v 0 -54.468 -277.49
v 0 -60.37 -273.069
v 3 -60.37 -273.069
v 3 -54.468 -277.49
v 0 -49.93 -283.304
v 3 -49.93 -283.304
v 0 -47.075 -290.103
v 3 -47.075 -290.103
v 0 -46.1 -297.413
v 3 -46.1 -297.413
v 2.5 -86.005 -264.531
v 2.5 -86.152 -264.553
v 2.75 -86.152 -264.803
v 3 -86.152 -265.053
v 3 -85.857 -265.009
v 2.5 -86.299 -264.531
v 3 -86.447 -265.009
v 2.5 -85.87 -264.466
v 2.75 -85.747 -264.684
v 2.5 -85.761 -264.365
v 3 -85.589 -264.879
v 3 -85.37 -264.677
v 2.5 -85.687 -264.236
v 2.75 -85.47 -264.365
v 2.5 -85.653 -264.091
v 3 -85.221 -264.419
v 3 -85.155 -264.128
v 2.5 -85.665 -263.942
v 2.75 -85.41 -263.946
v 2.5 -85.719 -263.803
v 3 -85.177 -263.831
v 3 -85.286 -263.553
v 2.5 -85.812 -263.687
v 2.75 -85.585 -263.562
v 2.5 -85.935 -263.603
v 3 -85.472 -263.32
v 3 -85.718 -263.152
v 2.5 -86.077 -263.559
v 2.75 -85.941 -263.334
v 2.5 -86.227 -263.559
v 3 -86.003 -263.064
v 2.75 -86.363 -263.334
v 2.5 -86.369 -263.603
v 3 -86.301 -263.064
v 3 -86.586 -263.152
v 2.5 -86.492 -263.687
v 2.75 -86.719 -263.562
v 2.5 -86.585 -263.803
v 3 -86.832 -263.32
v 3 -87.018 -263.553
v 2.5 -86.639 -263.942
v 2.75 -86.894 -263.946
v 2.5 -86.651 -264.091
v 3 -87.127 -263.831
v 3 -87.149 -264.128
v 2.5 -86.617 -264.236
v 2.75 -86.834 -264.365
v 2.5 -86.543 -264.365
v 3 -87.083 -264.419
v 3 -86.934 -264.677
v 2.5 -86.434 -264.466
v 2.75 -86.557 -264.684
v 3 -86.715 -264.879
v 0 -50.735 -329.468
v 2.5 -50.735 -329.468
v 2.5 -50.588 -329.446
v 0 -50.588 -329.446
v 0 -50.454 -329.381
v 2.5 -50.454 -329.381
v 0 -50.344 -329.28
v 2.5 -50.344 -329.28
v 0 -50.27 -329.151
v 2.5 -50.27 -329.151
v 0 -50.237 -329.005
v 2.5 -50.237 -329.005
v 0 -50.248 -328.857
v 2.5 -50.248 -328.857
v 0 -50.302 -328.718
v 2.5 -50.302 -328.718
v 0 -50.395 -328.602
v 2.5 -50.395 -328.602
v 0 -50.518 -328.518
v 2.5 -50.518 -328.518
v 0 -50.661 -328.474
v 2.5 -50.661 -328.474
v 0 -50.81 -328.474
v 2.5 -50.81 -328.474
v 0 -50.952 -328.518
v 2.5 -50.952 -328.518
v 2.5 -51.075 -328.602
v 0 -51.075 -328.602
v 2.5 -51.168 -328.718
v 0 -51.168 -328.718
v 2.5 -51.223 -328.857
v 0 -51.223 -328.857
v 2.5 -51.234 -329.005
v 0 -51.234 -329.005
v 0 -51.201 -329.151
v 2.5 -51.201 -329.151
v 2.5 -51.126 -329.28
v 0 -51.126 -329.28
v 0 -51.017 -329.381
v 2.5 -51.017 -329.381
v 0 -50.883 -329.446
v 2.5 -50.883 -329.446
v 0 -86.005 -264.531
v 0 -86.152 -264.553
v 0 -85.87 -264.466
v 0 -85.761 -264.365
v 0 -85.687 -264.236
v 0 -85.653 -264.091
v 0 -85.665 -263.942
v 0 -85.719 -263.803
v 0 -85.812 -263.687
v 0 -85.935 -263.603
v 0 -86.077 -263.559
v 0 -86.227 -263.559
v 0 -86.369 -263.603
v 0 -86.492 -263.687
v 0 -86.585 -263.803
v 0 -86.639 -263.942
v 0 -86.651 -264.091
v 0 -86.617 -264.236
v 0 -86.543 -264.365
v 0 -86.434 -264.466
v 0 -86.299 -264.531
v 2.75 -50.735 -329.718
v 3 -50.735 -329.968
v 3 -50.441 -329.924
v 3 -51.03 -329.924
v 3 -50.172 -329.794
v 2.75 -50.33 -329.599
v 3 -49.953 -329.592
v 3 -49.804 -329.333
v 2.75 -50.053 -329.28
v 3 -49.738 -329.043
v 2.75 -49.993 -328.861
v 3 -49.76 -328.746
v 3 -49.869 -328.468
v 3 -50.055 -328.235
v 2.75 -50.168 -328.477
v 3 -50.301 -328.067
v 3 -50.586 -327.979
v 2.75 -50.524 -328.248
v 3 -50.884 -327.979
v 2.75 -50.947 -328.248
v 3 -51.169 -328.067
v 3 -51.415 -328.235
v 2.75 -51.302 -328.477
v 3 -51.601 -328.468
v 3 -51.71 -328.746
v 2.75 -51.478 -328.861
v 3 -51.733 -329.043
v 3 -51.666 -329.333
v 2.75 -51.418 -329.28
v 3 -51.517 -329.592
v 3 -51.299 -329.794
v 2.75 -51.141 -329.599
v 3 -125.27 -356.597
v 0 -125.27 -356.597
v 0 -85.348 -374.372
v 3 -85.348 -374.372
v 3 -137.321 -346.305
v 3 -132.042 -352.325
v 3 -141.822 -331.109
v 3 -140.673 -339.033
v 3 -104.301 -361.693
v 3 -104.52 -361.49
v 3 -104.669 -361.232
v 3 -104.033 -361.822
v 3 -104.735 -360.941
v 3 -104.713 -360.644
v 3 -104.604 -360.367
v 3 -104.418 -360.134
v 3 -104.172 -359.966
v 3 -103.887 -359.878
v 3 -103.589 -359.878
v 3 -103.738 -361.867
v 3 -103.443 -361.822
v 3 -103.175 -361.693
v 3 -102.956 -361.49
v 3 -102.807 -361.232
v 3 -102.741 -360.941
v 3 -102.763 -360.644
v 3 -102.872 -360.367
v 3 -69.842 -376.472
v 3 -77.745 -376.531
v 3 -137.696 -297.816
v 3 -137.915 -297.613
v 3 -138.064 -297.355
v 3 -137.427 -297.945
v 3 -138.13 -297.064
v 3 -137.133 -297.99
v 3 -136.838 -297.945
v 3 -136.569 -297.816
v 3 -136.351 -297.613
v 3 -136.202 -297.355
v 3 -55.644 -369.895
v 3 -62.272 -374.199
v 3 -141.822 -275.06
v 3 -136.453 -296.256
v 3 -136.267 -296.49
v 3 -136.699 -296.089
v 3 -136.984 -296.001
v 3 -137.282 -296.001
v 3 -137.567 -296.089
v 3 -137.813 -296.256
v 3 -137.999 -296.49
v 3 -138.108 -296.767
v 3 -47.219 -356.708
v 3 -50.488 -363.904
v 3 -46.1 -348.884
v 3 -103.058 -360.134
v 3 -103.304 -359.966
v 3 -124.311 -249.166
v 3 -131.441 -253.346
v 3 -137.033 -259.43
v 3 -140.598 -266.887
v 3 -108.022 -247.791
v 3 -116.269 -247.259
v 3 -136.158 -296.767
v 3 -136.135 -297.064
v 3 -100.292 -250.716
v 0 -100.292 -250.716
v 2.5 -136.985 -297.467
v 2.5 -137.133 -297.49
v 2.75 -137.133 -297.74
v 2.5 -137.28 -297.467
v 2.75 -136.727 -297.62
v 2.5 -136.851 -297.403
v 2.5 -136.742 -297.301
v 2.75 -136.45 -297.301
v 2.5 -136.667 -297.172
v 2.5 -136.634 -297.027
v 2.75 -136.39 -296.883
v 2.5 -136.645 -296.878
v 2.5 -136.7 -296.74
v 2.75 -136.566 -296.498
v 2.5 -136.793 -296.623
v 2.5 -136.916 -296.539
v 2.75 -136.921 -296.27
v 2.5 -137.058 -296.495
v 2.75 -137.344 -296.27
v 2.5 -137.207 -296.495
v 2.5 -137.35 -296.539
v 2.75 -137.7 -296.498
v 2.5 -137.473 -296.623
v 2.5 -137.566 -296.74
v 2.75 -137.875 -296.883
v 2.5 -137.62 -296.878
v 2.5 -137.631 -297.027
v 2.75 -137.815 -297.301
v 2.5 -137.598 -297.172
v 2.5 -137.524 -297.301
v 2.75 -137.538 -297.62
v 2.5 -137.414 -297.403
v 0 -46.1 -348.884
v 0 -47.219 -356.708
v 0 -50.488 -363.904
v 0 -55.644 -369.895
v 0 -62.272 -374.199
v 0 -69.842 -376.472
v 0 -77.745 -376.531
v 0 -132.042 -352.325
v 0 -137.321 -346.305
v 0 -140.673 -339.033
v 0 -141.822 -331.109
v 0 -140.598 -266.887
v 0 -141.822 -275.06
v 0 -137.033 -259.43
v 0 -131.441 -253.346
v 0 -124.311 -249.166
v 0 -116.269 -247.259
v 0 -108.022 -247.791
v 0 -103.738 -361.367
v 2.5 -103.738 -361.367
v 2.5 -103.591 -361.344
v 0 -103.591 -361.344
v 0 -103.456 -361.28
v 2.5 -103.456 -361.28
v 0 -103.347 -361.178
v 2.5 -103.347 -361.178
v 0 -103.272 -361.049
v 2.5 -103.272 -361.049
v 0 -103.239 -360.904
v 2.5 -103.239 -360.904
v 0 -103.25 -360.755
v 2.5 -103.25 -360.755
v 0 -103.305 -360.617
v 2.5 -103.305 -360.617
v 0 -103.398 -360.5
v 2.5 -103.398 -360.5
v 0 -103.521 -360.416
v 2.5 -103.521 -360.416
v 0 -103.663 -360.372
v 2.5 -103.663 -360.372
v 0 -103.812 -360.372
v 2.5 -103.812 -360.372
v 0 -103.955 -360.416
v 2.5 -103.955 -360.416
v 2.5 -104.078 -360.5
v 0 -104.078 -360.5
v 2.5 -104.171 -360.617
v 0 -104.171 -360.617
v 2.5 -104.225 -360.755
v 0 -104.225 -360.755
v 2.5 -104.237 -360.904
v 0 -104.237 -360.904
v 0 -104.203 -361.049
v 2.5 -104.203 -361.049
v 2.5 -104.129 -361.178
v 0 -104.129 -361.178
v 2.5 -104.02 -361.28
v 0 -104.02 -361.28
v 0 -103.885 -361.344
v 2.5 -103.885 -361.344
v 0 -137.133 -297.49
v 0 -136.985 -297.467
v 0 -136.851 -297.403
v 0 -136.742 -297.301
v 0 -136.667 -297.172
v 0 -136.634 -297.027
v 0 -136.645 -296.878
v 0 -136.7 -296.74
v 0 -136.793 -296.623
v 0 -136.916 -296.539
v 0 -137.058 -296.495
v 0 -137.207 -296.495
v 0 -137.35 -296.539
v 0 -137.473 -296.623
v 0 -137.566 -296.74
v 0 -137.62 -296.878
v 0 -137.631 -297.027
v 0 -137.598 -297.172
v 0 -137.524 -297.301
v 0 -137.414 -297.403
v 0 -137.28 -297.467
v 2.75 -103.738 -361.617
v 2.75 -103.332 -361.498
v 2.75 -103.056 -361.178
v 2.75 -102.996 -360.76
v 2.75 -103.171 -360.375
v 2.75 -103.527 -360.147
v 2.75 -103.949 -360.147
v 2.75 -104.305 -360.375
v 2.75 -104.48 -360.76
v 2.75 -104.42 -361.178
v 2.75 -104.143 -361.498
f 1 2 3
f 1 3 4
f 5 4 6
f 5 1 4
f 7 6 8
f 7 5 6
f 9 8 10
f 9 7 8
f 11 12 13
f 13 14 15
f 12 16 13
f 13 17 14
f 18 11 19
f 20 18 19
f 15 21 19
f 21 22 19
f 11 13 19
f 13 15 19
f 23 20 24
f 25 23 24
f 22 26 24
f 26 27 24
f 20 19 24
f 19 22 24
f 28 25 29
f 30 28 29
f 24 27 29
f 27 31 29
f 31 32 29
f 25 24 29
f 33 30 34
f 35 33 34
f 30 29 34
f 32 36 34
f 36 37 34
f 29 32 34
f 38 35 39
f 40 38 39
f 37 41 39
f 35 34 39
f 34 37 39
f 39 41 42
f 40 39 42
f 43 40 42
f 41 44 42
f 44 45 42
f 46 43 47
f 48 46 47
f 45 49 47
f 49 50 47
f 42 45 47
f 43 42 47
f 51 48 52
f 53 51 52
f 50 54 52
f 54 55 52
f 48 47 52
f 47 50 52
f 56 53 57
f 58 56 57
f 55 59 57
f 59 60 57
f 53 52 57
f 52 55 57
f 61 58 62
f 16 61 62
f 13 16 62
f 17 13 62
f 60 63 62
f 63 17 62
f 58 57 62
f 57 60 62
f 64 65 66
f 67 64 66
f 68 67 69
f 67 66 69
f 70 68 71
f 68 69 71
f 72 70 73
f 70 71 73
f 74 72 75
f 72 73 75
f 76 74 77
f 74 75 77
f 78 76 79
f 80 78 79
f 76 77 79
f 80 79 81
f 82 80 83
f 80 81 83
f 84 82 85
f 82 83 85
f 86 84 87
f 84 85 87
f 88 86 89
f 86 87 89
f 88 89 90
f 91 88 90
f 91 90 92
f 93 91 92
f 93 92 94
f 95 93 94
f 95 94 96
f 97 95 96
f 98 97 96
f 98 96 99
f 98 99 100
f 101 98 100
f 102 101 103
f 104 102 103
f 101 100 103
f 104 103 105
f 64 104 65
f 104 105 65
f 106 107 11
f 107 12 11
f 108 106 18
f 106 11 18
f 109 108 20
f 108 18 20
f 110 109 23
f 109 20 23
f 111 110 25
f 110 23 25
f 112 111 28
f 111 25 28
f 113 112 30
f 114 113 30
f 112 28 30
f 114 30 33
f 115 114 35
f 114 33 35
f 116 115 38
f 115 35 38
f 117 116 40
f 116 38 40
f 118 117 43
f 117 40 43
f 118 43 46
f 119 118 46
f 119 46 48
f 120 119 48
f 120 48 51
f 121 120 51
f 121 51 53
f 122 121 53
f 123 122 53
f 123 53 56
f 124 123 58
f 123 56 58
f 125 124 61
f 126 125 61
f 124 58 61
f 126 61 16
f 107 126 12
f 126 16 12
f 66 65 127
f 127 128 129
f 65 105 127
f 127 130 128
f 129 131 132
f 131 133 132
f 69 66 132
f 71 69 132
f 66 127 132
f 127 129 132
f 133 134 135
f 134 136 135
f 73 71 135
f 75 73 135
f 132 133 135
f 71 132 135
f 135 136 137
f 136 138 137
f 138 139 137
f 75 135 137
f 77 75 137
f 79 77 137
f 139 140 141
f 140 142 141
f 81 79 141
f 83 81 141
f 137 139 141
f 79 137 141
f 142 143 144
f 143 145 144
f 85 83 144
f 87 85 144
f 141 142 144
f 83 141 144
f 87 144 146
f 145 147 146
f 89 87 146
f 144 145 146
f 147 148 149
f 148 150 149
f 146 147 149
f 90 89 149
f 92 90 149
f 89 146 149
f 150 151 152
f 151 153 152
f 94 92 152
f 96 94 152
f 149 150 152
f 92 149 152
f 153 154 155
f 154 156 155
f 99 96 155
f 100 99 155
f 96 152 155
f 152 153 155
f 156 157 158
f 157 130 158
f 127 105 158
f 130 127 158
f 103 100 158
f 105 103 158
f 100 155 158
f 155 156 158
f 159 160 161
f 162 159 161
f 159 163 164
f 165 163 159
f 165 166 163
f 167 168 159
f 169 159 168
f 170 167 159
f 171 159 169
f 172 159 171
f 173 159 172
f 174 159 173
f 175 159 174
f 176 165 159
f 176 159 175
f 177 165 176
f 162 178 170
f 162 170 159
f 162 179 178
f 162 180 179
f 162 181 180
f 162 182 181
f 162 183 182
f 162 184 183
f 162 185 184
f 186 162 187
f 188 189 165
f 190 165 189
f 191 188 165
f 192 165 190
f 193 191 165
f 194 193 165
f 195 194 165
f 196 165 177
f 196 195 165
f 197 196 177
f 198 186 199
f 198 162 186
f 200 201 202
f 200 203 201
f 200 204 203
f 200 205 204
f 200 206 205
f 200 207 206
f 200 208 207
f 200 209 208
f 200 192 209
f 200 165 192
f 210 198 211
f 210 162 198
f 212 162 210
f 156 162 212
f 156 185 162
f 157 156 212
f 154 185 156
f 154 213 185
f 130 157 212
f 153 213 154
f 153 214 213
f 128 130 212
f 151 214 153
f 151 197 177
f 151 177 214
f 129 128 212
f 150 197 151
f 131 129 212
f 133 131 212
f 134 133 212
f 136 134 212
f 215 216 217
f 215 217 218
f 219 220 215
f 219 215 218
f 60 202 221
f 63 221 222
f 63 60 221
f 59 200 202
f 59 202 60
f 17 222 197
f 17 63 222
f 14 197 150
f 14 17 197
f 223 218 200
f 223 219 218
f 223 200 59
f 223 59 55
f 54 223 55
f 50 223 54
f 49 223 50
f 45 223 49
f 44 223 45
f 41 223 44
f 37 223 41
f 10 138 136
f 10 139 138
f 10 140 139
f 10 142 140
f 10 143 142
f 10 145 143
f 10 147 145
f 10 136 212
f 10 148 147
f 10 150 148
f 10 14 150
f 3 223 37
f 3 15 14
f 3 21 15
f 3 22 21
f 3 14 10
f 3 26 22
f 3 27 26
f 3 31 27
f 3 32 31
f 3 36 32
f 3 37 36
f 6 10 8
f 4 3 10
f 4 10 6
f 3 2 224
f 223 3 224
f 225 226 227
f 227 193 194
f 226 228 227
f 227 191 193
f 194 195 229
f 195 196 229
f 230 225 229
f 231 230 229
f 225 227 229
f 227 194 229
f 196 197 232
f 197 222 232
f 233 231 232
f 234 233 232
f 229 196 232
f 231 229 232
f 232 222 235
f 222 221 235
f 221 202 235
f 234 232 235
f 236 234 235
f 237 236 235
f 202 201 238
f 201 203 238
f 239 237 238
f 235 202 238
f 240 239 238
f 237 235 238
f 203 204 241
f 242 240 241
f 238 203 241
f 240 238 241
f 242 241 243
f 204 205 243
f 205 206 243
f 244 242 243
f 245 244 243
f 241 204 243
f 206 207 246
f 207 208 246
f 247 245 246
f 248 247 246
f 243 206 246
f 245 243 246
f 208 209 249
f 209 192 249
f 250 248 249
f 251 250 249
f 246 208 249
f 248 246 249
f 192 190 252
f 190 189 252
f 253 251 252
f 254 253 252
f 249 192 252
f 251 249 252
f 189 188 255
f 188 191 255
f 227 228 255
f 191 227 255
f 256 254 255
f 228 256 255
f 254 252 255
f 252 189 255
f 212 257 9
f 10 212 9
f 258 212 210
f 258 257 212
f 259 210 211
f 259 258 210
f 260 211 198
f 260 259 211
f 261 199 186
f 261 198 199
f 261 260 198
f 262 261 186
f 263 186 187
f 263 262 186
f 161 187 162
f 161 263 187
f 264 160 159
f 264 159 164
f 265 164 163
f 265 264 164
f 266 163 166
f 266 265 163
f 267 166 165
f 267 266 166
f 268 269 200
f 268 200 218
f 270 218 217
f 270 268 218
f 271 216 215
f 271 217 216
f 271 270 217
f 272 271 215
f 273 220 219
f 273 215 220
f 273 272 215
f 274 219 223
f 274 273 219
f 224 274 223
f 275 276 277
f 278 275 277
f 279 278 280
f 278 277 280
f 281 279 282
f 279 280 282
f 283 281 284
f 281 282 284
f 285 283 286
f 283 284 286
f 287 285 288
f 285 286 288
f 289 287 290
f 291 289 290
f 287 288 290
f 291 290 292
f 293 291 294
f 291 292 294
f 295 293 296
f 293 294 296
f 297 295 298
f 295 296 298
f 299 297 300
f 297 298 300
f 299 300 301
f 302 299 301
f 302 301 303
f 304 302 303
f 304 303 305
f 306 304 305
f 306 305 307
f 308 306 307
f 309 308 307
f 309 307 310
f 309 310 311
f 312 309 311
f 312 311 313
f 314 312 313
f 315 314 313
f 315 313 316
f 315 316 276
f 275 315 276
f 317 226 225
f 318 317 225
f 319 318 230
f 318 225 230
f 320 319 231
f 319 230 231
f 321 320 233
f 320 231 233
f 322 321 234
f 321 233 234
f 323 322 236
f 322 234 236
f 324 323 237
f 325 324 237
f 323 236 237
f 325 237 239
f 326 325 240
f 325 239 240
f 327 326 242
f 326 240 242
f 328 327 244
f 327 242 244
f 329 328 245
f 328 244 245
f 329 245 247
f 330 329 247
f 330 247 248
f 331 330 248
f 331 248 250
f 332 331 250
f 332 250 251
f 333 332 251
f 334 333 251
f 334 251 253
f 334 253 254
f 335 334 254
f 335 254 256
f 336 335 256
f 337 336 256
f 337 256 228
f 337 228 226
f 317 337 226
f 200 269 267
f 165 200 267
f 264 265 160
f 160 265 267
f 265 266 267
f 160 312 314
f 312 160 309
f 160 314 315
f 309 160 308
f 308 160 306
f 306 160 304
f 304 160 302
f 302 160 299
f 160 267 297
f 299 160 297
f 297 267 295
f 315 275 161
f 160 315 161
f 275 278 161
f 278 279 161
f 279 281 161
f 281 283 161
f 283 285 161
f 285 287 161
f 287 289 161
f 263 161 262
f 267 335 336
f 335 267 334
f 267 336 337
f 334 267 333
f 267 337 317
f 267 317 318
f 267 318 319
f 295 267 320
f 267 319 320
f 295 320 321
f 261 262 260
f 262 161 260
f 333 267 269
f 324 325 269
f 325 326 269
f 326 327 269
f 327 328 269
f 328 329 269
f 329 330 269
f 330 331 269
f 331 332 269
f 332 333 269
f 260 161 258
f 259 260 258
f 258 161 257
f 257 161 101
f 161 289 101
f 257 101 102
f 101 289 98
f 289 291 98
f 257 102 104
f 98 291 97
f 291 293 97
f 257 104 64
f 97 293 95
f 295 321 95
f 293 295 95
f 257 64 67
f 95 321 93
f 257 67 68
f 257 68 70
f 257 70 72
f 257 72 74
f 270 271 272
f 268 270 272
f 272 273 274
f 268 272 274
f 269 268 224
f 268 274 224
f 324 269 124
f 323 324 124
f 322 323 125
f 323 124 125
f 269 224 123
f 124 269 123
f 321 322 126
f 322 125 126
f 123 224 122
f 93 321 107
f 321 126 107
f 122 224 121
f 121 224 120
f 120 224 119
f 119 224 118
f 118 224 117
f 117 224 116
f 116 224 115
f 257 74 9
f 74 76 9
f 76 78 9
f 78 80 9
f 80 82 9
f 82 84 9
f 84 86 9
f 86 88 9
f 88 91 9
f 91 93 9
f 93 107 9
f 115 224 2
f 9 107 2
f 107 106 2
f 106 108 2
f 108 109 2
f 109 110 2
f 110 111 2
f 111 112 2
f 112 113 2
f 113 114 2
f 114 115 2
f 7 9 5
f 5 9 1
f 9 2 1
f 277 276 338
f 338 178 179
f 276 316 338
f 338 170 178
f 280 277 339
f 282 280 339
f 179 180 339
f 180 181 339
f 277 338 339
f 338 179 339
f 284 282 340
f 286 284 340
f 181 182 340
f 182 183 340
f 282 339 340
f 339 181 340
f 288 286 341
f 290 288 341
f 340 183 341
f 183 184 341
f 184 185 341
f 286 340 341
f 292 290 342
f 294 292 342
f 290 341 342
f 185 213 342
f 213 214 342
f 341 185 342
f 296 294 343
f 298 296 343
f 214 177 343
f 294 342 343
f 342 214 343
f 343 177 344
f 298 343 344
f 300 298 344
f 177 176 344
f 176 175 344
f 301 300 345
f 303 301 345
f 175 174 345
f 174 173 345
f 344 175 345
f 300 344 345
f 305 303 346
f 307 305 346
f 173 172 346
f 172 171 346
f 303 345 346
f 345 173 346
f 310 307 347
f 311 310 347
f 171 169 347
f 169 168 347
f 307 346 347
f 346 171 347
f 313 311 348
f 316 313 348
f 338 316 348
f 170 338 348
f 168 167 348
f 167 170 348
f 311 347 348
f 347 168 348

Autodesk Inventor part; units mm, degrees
ref_plane "YZ Plane" through (0, 0, 0) normal (1, 0, 0) x (0, 1, 0)
ref_plane "XZ Plane" through (0, 0, 0) normal (0, 1, 0) x (-1, 0, 0)
ref_plane "XY Plane" through (0, 0, 0) normal (0, 0, 1) x (1, 0, 0)
sketch "Sketch1" plane through (0, 0, 0) normal (1, 0, 0) x (0, 1, 0)
  line L0 (0, -332) -> (-46, -332) construction
  line L1 (-46, -332) -> (-46, -297.4128)
  line L2 (-46, -332) -> (-46, -348.8838)
  line L3 (-85.3886, -374.4631) -> (-125.3109, -356.6885)
  line L4 (-141.9223, -331.1092) -> (-141.9223, -275.0602)
  arc A0 (-85.3886, -374.4631) -> (-46, -348.8838) centre (-74, -348.8838) ccw
  arc A1 (-100.2431, -250.629) -> (-141.9223, -275.0602) centre (-113.9223, -275.0602) ccw
  arc A2 (-46, -297.4128) -> (-60.3209, -272.9817) centre (-74, -297.4128) ccw
  arc A3 (-141.9223, -331.1092) -> (-125.3109, -356.6885) centre (-113.9223, -331.1092) ccw
  line L5 (0, -332) -> (-46, -332) construction
  line L6 (-46, -332) -> (-46, -297.4128)
  line L7 (-46, -332) -> (-46, -348.8838)
  line L8 (-85.3886, -374.4631) -> (-125.3109, -356.6885)
  line L9 (-141.9223, -331.1092) -> (-141.9223, -275.0602)
  arc A4 (-85.3886, -374.4631) -> (-46, -348.8838) centre (-74, -348.8838) ccw
  arc A5 (-100.2431, -250.629) -> (-141.9223, -275.0602) centre (-113.9223, -275.0602) ccw
  arc A6 (-46, -297.4128) -> (-60.3209, -272.9817) centre (-74, -297.4128) ccw
  arc A7 (-141.9223, -331.1092) -> (-125.3109, -356.6885) centre (-113.9223, -331.1092) ccw
  line L10 (0, -332) -> (-46, -332) construction
  line L11 (-46, -332) -> (-46, -297.4128)
  line L12 (-46, -332) -> (-46, -348.8838)
  line L13 (-85.3886, -374.4631) -> (-125.3109, -356.6885)
  line L14 (-141.9223, -331.1092) -> (-141.9223, -275.0602)
  line L15 (-60.3209, -272.9817) -> (-100.2431, -250.629)
  arc A8 (-85.3886, -374.4631) -> (-46, -348.8838) centre (-74, -348.8838) ccw
  arc A9 (-100.2431, -250.629) -> (-141.9223, -275.0602) centre (-113.9223, -275.0602) ccw
  arc A10 (-46, -297.4128) -> (-60.3209, -272.9817) centre (-74, -297.4128) ccw
  arc A11 (-141.9223, -331.1092) -> (-125.3109, -356.6885) centre (-113.9223, -331.1092) ccw
  line L16 (-141.8223, -275.0602) -> (-141.8223, -331.1092)
  arc A12 (-141.8223, -331.1092) -> (-125.2702, -356.5972) centre (-113.9223, -331.1092) ccw
  line L17 (-125.2702, -356.5972) -> (-85.348, -374.3717)
  arc A13 (-85.348, -374.3717) -> (-46.1, -348.8838) centre (-74, -348.8838) ccw
  line L18 (-46.1, -348.8838) -> (-46.1, -332)
  line L19 (-46.1, -332) -> (-46.1, -297.4128)
  arc A14 (-46.1, -297.4128) -> (-60.3697, -273.0689) centre (-74, -297.4128) ccw
  line L20 (-60.3697, -273.0689) -> (-100.292, -250.7163)
  arc A15 (-100.292, -250.7163) -> (-141.8223, -275.0602) centre (-113.9223, -275.0602) ccw
  point P0 (0, 0)
  point P1 (-46, -281)
  point P2 (-46, -392)
  point P3 (-141.9223, -349.2927)
  point P4 (-141.9223, -227.2927)
  point P5 (-46, -281)
  point P6 (-46, -392)
  point P7 (-141.9223, -349.2927)
  point P8 (-141.9223, -227.2927)
  point P9 (-46, -281)
  point P10 (-46, -392)
  point P11 (-141.9223, -349.2927)
  point P12 (-141.9223, -227.2927)
  dimension "d43" = 0
  dimension "d0" = 46
  dimension "d1" = 51
  dimension "d2" = 60
  dimension "d3" = 105
  dimension "d4" = 66
  dimension "d5" = 122
  dimension "d6" = 28
  dimension "d7" = 28
  dimension "d8" = 28
  dimension "d9" = 46
  dimension "d11" = 60
  dimension "d12" = 105
  dimension "d13" = 66
  dimension "d14" = 122
  dimension "d15" = 28
  dimension "d16" = 28
  dimension "d17" = 28
  dimension "d18" = 46
  dimension "d21" = 105
  dimension "d22" = 66
  dimension "d23" = 122
  dimension "d24" = 28
  dimension "d25" = 28
  dimension "d26" = 28
  dimension "d27" = 0.1
extrude "Extrusion1" add sketch "Sketch1" along normal blind 3 contours A15 L20 A14 L19 L18 A13 L17 A12 L16
sketch "Sketch2" plane through (3, 0, 0) normal (1, 0, 0) x (0, 0, -1)
  arc A0 (250.7163, -100.292) -> (275.0602, -141.8223) centre (275.0602, -113.9223) ccw projected
  arc A1 (374.3717, -85.348) -> (348.8838, -46.1) centre (348.8838, -74) ccw projected
  arc A2 (297.4128, -46.1) -> (273.0689, -60.3697) centre (297.4128, -74) ccw projected
  arc A3 (331.1092, -141.8223) -> (356.5972, -125.2702) centre (331.1092, -113.9223) ccw projected
  circle A4 centre (328.9681, -50.7353) radius 0.5
  line L0 (273.0689, -60.3697) -> (250.7163, -100.292) projected
  circle A5 centre (264.0532, -86.152) radius 0.5
  line L1 (356.5972, -125.2702) -> (374.3717, -85.348) projected
  circle A6 centre (360.8666, -103.7379) radius 0.5
  line L2 (275.0602, -141.8223) -> (331.1092, -141.8223) projected
  circle A7 centre (296.9895, -137.1327) radius 0.5
  point P0 (0, 0)
extrude "Extrusion2" cut sketch "Sketch2" against normal blind 5
chamfer "Chamfer1" distance 0.5 angle 45 1 edges at (3, -86.152, -263.5532)
chamfer "Chamfer2" distance 0.5 angle 45 3 edges at (3, -137.1327, -296.4895) (3, -103.7379, -360.3666) (3, -50.7353, -328.4681)
properties part number "tampa traseira do corpo" material "PET Plastic"
